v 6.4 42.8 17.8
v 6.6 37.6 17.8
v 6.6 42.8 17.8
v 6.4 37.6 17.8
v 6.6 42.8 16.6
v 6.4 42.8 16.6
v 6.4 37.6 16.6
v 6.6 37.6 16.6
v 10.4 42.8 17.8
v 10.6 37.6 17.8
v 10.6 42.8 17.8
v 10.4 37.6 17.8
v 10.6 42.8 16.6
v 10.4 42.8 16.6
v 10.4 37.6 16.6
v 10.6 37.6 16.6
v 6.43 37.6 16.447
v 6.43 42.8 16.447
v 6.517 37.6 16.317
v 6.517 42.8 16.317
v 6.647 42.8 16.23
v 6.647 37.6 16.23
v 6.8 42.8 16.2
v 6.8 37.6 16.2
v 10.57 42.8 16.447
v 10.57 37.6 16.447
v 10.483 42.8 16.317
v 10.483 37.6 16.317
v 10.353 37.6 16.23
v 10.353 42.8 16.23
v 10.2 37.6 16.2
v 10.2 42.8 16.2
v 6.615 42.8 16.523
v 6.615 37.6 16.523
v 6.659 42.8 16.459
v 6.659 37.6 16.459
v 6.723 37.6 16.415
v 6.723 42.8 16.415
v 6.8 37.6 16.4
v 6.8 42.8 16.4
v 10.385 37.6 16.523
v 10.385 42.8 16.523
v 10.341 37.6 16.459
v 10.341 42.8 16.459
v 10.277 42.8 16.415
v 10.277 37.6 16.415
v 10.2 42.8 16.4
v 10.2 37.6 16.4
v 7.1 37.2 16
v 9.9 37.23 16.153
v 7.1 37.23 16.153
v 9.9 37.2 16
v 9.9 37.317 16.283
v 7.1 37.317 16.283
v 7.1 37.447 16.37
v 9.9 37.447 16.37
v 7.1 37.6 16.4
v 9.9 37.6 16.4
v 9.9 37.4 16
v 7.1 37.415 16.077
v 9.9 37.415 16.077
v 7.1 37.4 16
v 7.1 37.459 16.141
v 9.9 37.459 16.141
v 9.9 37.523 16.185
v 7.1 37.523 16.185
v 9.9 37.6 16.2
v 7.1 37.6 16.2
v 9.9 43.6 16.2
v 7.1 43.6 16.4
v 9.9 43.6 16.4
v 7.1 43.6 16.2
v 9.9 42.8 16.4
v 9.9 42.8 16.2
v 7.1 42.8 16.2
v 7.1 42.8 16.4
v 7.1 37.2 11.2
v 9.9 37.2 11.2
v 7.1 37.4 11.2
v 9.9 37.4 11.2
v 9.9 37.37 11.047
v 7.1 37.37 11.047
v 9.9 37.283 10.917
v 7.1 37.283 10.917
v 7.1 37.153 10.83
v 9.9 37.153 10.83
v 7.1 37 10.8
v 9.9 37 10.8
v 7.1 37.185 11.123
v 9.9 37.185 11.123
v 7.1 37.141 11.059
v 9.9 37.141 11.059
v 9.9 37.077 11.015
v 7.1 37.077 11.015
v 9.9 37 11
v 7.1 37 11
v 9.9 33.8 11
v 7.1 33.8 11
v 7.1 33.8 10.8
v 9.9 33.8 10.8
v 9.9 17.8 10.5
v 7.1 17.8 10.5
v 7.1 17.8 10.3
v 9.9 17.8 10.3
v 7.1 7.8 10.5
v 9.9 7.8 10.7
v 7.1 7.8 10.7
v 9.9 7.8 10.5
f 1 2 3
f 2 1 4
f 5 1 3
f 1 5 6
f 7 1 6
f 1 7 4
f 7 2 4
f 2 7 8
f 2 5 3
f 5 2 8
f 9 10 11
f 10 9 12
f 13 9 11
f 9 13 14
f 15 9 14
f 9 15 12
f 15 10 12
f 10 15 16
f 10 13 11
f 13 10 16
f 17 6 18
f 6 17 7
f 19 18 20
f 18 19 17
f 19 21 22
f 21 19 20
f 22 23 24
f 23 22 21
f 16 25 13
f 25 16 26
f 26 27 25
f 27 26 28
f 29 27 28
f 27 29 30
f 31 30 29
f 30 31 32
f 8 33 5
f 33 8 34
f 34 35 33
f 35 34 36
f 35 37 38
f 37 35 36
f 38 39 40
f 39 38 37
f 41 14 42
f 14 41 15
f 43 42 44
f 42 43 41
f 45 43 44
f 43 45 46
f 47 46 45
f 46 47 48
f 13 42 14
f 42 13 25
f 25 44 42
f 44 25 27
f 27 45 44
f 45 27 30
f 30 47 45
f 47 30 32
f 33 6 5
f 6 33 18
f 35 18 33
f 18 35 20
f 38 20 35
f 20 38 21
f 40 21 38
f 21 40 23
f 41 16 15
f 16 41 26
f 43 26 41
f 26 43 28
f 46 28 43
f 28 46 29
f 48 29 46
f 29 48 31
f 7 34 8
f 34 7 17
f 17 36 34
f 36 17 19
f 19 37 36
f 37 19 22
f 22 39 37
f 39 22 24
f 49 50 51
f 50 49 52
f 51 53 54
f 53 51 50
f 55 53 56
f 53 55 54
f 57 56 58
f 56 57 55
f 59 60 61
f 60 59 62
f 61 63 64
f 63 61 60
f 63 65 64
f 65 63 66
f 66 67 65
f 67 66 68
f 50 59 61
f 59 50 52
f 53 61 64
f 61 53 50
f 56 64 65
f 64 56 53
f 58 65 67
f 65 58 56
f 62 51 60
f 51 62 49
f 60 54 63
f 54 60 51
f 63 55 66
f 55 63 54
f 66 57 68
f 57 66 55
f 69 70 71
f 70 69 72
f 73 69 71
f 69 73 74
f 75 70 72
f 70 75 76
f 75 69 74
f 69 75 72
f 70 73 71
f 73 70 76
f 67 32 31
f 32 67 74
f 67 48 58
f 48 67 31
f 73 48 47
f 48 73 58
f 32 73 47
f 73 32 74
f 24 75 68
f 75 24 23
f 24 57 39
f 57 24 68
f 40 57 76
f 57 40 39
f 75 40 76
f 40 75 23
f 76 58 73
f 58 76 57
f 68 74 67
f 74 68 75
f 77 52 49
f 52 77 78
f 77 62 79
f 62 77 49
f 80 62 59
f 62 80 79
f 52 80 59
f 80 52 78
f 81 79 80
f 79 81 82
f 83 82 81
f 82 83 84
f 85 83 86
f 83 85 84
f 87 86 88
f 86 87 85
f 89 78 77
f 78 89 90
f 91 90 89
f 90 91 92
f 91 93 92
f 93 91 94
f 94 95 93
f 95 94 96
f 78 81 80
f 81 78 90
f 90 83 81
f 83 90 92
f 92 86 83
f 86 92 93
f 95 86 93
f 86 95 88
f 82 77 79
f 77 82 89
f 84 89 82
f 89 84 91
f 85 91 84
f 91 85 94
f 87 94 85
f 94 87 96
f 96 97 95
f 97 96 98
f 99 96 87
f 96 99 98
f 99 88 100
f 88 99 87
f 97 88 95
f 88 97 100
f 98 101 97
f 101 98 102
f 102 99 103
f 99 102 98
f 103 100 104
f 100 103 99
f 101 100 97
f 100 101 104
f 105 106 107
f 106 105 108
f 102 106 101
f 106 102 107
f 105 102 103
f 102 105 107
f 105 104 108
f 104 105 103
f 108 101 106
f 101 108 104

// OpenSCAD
// file: ../p/1-4edge.scad
use <../lib.scad>
function ldraw_lib__1_4edge() = [
// 0 Circle 0.25
// 0 Name: 1-4edge.dat
// 0 Author: James Jessiman
// 0 !LDRAW_ORG Primitive UPDATE 2017-01
// 0 !LICENSE Licensed under CC BY 4.0 : see CAreadme.txt
// 
// 0 BFC CERTIFY CCW
  [0,"BFC","CERTIFY"],
  [0,"BFC","CCW"],
// 
// 0 !HISTORY 2007-06-22 [PTadmin] Header formatted for Contributor Agreement
// 0 !HISTORY 2008-07-01 [PTadmin] Official Update 2008-01
// 0 !HISTORY 2017-01-15 [Steffen] BFCed
// 0 !HISTORY 2017-12-30 [PTadmin] Official Update 2017-01
// 
// 
// 2 24 1 0 0 0.9239 0 0.3827
  [2,24,1,0,0,0.9239,0,0.3827],
// 2 24 0.9239 0 0.3827 0.7071 0 0.7071
  [2,24,0.9239,0,0.3827,0.7071,0,0.7071],
// 2 24 0.7071 0 0.7071 0.3827 0 0.9239
  [2,24,0.7071,0,0.7071,0.3827,0,0.9239],
// 2 24 0.3827 0 0.9239 0 0 1
  [2,24,0.3827,0,0.9239,0,0,1],
];
module ldraw_lib__1_4edge(step=0, col=false, unit=2/5, alt=false, line=0.2, solid=!$preview)
    makepoly(ldraw_lib__1_4edge(), step=step, col=col, unit=unit, alt=alt, line=line, solid=solid);
ldraw_lib__1_4edge(line=0.2);
// file: ../p/1-4cyli.scad
use <../lib.scad>
function ldraw_lib__1_4cyli() = [
// 0 Cylinder 0.25
// 0 Name: 1-4cyli.dat
// 0 Author: James Jessiman
// 0 !LDRAW_ORG Primitive UPDATE 2012-01
// 0 !LICENSE Licensed under CC BY 4.0 : see CAreadme.txt
// 
// 0 BFC CERTIFY CCW
  [0,"BFC","CERTIFY"],
  [0,"BFC","CCW"],
// 
// 0 !HISTORY 2002-03-23 [sbliss] Added BFC statement.
// 0 !HISTORY 2002-04-25 [PTadmin] Official Update 2002-02
// 0 !HISTORY 2007-06-22 [PTadmin] Header formatted for Contributor Agreement
// 0 !HISTORY 2008-07-01 [PTadmin] Official Update 2008-01
// 0 !HISTORY 2012-02-16 [Philo] Changed to CCW
// 0 !HISTORY 2012-03-30 [PTadmin] Official Update 2012-01
// 
// 
// 4 16 1 1 0 0.9239 1 0.3827 0.9239 0 0.3827 1 0 0
  [4,16,1,1,0,0.9239,1,0.3827,0.9239,0,0.3827,1,0,0],
// 5 24 1 0 0 1 1 0 0.9239 0 0.3827 1 0 -1
  [5,24,1,0,0,1,1,0,0.9239,0,0.3827,1,0,-1],
// 4 16 0.9239 1 0.3827 0.7071 1 0.7071 0.7071 0 0.7071 0.9239 0 0.3827
  [4,16,0.9239,1,0.3827,0.7071,1,0.7071,0.7071,0,0.7071,0.9239,0,0.3827],
// 5 24 0.9239 0 0.3827 0.9239 1 0.3827 0.7071 0 0.7071 1 0 0
  [5,24,0.9239,0,0.3827,0.9239,1,0.3827,0.7071,0,0.7071,1,0,0],
// 4 16 0.7071 1 0.7071 0.3827 1 0.9239 0.3827 0 0.9239 0.7071 0 0.7071
  [4,16,0.7071,1,0.7071,0.3827,1,0.9239,0.3827,0,0.9239,0.7071,0,0.7071],
// 5 24 0.7071 0 0.7071 0.7071 1 0.7071 0.3827 0 0.9239 0.9239 0 0.3827
  [5,24,0.7071,0,0.7071,0.7071,1,0.7071,0.3827,0,0.9239,0.9239,0,0.3827],
// 4 16 0.3827 1 0.9239 0 1 1 0 0 1 0.3827 0 0.9239
  [4,16,0.3827,1,0.9239,0,1,1,0,0,1,0.3827,0,0.9239],
// 5 24 0.3827 0 0.9239 0.3827 1 0.9239 0 0 1 0.7071 0 0.7071
  [5,24,0.3827,0,0.9239,0.3827,1,0.9239,0,0,1,0.7071,0,0.7071],
// 5 24 0 0 1 0 1 1 0.3827 0 0.9239 -1 0 1
  [5,24,0,0,1,0,1,1,0.3827,0,0.9239,-1,0,1],
];
module ldraw_lib__1_4cyli(step=0, col=false, unit=2/5, alt=false, line=0.2, solid=!$preview)
    makepoly(ldraw_lib__1_4cyli(), step=step, col=col, unit=unit, alt=alt, line=line, solid=solid);
ldraw_lib__1_4cyli(line=0.2);
// file: ../p/box5-4a.scad
use <../lib.scad>
function ldraw_lib__box5_4a() = [
// 0 Box with  5 Faces without  4 Adjacent Edges
// 0 Name: box5-4a.dat
// 0 Author: Willy Tschager [Holly-Wood]
// 0 !LDRAW_ORG Primitive UPDATE 2024-01
// 0 !LICENSE Licensed under CC BY 4.0 : see CAreadme.txt
// 
// 0 BFC CERTIFY CCW
  [0,"BFC","CERTIFY"],
  [0,"BFC","CCW"],
// 
// 0 !HISTORY 2009-05-02 [PTadmin] Official Update 2009-01
// 0 !HISTORY 2024-01-03 [Holly-Wood] Complete re-write, original by guyvivan
// 0 !HISTORY 2024-01-29 [OrionP] Official Update 2024-01
// 
// 2 24 -1 1 -1 -1 1 1
  [2,24,-1,1,-1,-1,1,1],
// 2 24 1 1 1 1 1 -1
  [2,24,1,1,1,1,1,-1],
// 2 24 -1 1 1 1 1 1
  [2,24,-1,1,1,1,1,1],
// 2 24 -1 1 -1 1 1 -1
  [2,24,-1,1,-1,1,1,-1],
// 4 16 1 1 1 1 1 -1 -1 1 -1 -1 1 1
  [4,16,1,1,1,1,1,-1,-1,1,-1,-1,1,1],
// 
// 2 24 -1 0 -1 -1 1 -1
  [2,24,-1,0,-1,-1,1,-1],
// 2 24 -1 1 1 -1 0 1
  [2,24,-1,1,1,-1,0,1],
// 4 16 -1 1 1 -1 1 -1 -1 0 -1 -1 0 1
  [4,16,-1,1,1,-1,1,-1,-1,0,-1,-1,0,1],
// 
// 2 24 1 0 -1 1 1 -1
  [2,24,1,0,-1,1,1,-1],
// 2 24 1 1 1 1 0 1
  [2,24,1,1,1,1,0,1],
// 4 16 1 1 -1 1 1 1 1 0 1 1 0 -1
  [4,16,1,1,-1,1,1,1,1,0,1,1,0,-1],
// 
// 4 16 1 1 1 -1 1 1 -1 0 1 1 0 1
  [4,16,1,1,1,-1,1,1,-1,0,1,1,0,1],
// 4 16 -1 1 -1 1 1 -1 1 0 -1 -1 0 -1
  [4,16,-1,1,-1,1,1,-1,1,0,-1,-1,0,-1],
];
module ldraw_lib__box5_4a(step=0, col=false, unit=2/5, alt=false, line=0.2, solid=!$preview)
    makepoly(ldraw_lib__box5_4a(), step=step, col=col, unit=unit, alt=alt, line=line, solid=solid);
ldraw_lib__box5_4a(line=0.2);
// file: ../p/box5-2p.scad
use <../lib.scad>
function ldraw_lib__box5_2p() = [
// 0 Box with  5 Faces without  2 Parallel Edges
// 0 Name: box5-2p.dat
// 0 Author: Willy Tschager [Holly-Wood]
// 0 !LDRAW_ORG Primitive UPDATE 2024-01
// 0 !LICENSE Licensed under CC BY 4.0 : see CAreadme.txt
// 
// 0 BFC CERTIFY CCW
  [0,"BFC","CERTIFY"],
  [0,"BFC","CCW"],
// 
// 0 !HISTORY 2012-03-30 [PTadmin] Official Update 2012-01
// 0 !HISTORY 2024-01-04 [Holly-Wood] Complete re-write, original by Brickaneer
// 0 !HISTORY 2024-01-29 [OrionP] Official Update 2024-01
// 
// 2 24 -1 1 1 1 1 1
  [2,24,-1,1,1,1,1,1],
// 2 24 -1 1 -1 -1 1 1
  [2,24,-1,1,-1,-1,1,1],
// 2 24 1 1 -1 -1 1 -1
  [2,24,1,1,-1,-1,1,-1],
// 2 24 1 1 1 1 1 -1
  [2,24,1,1,1,1,1,-1],
// 4 16 1 1 1 1 1 -1 -1 1 -1 -1 1 1
  [4,16,1,1,1,1,1,-1,-1,1,-1,-1,1,1],
// 
// 2 24 -1 1 1 -1 0 1
  [2,24,-1,1,1,-1,0,1],
// 2 24 -1 1 -1 -1 0 -1
  [2,24,-1,1,-1,-1,0,-1],
// 2 24 -1 0 -1 -1 0 1
  [2,24,-1,0,-1,-1,0,1],
// 4 16 -1 1 1 -1 1 -1 -1 0 -1 -1 0 1
  [4,16,-1,1,1,-1,1,-1,-1,0,-1,-1,0,1],
// 
// 2 24 1 1 1 1 0 1
  [2,24,1,1,1,1,0,1],
// 2 24 1 1 -1 1 0 -1
  [2,24,1,1,-1,1,0,-1],
// 2 24 1 0 1 1 0 -1
  [2,24,1,0,1,1,0,-1],
// 4 16 1 1 -1 1 1 1 1 0 1 1 0 -1
  [4,16,1,1,-1,1,1,1,1,0,1,1,0,-1],
// 
// 4 16 1 1 1 -1 1 1 -1 0 1 1 0 1
  [4,16,1,1,1,-1,1,1,-1,0,1,1,0,1],
// 4 16 -1 1 -1 1 1 -1 1 0 -1 -1 0 -1
  [4,16,-1,1,-1,1,1,-1,1,0,-1,-1,0,-1],
];
module ldraw_lib__box5_2p(step=0, col=false, unit=2/5, alt=false, line=0.2, solid=!$preview)
    makepoly(ldraw_lib__box5_2p(), step=step, col=col, unit=unit, alt=alt, line=line, solid=solid);
ldraw_lib__box5_2p(line=0.2);
// file: ../p/box4o8a.scad
use <../lib.scad>
function ldraw_lib__box4o8a() = [
// 0 Box with 4 Faces (2 Parallel Pairs) without Top and Bottom Edges
// 0 Name: box4o8a.dat
// 0 Author: Steffen [Steffen]
// 0 !LDRAW_ORG Primitive UPDATE 2012-01
// 0 !LICENSE Licensed under CC BY 4.0 : see CAreadme.txt
// 
// 0 BFC CERTIFY CCW
  [0,"BFC","CERTIFY"],
  [0,"BFC","CCW"],
// 
// 0 !HISTORY 2004-04-22 [PTadmin] Official Update 2004-02
// 0 !HISTORY 2007-06-24 [PTadmin] Header formatted for Contributor Agreement
// 0 !HISTORY 2008-07-01 [PTadmin] Official Update 2008-01
// 0 !HISTORY 2012-02-16 [Philo] Changed to CCW
// 0 !HISTORY 2012-03-30 [PTadmin] Official Update 2012-01
// 
// 
// 2 24 1 0 1 1 1 1
  [2,24,1,0,1,1,1,1],
// 2 24 -1 0 1 -1 1 1
  [2,24,-1,0,1,-1,1,1],
// 2 24 1 0 -1 1 1 -1
  [2,24,1,0,-1,1,1,-1],
// 2 24 -1 0 -1 -1 1 -1
  [2,24,-1,0,-1,-1,1,-1],
// 4 16 -1 1 1 -1 0 1 1 0 1 1 1 1
  [4,16,-1,1,1,-1,0,1,1,0,1,1,1,1],
// 4 16 -1 1 -1 -1 0 -1 -1 0 1 -1 1 1
  [4,16,-1,1,-1,-1,0,-1,-1,0,1,-1,1,1],
// 4 16 1 1 -1 1 0 -1 -1 0 -1 -1 1 -1
  [4,16,1,1,-1,1,0,-1,-1,0,-1,-1,1,-1],
// 4 16 1 1 1 1 0 1 1 0 -1 1 1 -1
  [4,16,1,1,1,1,0,1,1,0,-1,1,1,-1],
];
module ldraw_lib__box4o8a(step=0, col=false, unit=2/5, alt=false, line=0.2, solid=!$preview)
    makepoly(ldraw_lib__box4o8a(), step=step, col=col, unit=unit, alt=alt, line=line, solid=solid);
ldraw_lib__box4o8a(line=0.2);
// file: ../p/1-4ring1.scad
use <../lib.scad>
function ldraw_lib__1_4ring1() = [
// 0 Ring  1 x 0.25
// 0 Name: 1-4ring1.dat
// 0 Author: Chris Dee [cwdee]
// 0 !LDRAW_ORG Primitive UPDATE 2012-01
// 0 !LICENSE Licensed under CC BY 4.0 : see CAreadme.txt
// 
// 0 BFC CERTIFY CCW
  [0,"BFC","CERTIFY"],
  [0,"BFC","CCW"],
// 
// 0 !HISTORY 2000-05-07 [PTadmin] Official Update 2000-01
// 0 !HISTORY 2002-11-22 [hafhead] Added BFC statement
// 0 !HISTORY 2002-11-30 [PTadmin] Official Update 2002-05
// 0 !HISTORY 2007-06-22 [PTadmin] Header formatted for Contributor Agreement
// 0 !HISTORY 2008-07-01 [PTadmin] Official Update 2008-01
// 0 !HISTORY 2012-02-16 [Philo] Changed to CCW
// 0 !HISTORY 2012-03-30 [PTadmin] Official Update 2012-01
// 
// 
// 4 16 2 0 0 1.8478 0 0.7654 0.9239 0 0.3827 1 0 0
  [4,16,2,0,0,1.8478,0,0.7654,0.9239,0,0.3827,1,0,0],
// 4 16 1.8478 0 0.7654 1.4142 0 1.4142 0.7071 0 0.7071 0.9239 0 0.3827
  [4,16,1.8478,0,0.7654,1.4142,0,1.4142,0.7071,0,0.7071,0.9239,0,0.3827],
// 4 16 1.4142 0 1.4142 0.7654 0 1.8478 0.3827 0 0.9239 0.7071 0 0.7071
  [4,16,1.4142,0,1.4142,0.7654,0,1.8478,0.3827,0,0.9239,0.7071,0,0.7071],
// 4 16 0.7654 0 1.8478 0 0 2 0 0 1 0.3827 0 0.9239
  [4,16,0.7654,0,1.8478,0,0,2,0,0,1,0.3827,0,0.9239],
];
module ldraw_lib__1_4ring1(step=0, col=false, unit=2/5, alt=false, line=0.2, solid=!$preview)
    makepoly(ldraw_lib__1_4ring1(), step=step, col=col, unit=unit, alt=alt, line=line, solid=solid);
ldraw_lib__1_4ring1(line=0.2);
// file: ../p/1-4cylo.scad
use <../lib.scad>
use <1-4cyli.scad>
use <1-4edge.scad>
function ldraw_lib__1_4cylo() = [
// 0 Cylinder Open 0.25
// 0 Name: 1-4cylo.dat
// 0 Author: Max Martin Richter [MMR1988]
// 0 !LDRAW_ORG Primitive UPDATE 2010-03
// 0 !LICENSE Licensed under CC BY 4.0 : see CAreadme.txt
// 
// 0 BFC CERTIFY CCW
  [0,"BFC","CERTIFY"],
  [0,"BFC","CCW"],
// 
// 0 !HISTORY 2010-12-31 [PTadmin] Official Update 2010-03
// 
// 
// 1 16 0 0 0 1 0 0 0 1 0 0 0 1 1-4edge.dat
  [1,16,0,0,0,1,0,0,0,1,0,0,0,1, ldraw_lib__1_4edge()],
// 1 16 0 1 0 1 0 0 0 1 0 0 0 1 1-4edge.dat
  [1,16,0,1,0,1,0,0,0,1,0,0,0,1, ldraw_lib__1_4edge()],
// 1 16 0 0 0 1 0 0 0 1 0 0 0 1 1-4cyli.dat
  [1,16,0,0,0,1,0,0,0,1,0,0,0,1, ldraw_lib__1_4cyli()],
];
module ldraw_lib__1_4cylo(step=0, col=false, unit=2/5, alt=false, line=0.2, solid=!$preview)
    makepoly(ldraw_lib__1_4cylo(), step=step, col=col, unit=unit, alt=alt, line=line, solid=solid);
ldraw_lib__1_4cylo(line=0.2);
// main file
use <../lib.scad>
use <../p/1-4cylo.scad>
use <../p/1-4ring1.scad>
use <../p/box4o8a.scad>
use <../p/box5-2p.scad>
use <../p/box5-4a.scad>
function ldraw_lib__u9574_f2() = [
// 0 ~Electric 9V Battery Box  4 x 14 x  4 - Buttons - Contact, Button Pressed Position
// 0 Name: u9574-f2.dat
// 0 Author: Gerald Lasser [GeraldLasser]
// 0 !LDRAW_ORG Part UPDATE 2024-11
// 0 !LICENSE Licensed under CC BY 4.0 : see CAreadme.txt
// 
// 0 BFC CERTIFY CCW
  [0,"BFC","CERTIFY"],
  [0,"BFC","CCW"],
// 
// 0 !HISTORY 2024-12-30 [OrionP] Official Update 2024-11
// 
// 1 16 16.25 -41.5 100.5 .25 0 0 0 -3 0 0 0 6.5 box5-4a.dat
  [1,16,16.25,-41.5,100.5,.25,0,0,0,-3,0,0,0,6.5, ldraw_lib__box5_4a()],
// 1 16 26.25 -41.5 100.5 .25 0 0 0 -3 0 0 0 6.5 box5-4a.dat
  [1,16,26.25,-41.5,100.5,.25,0,0,0,-3,0,0,0,6.5, ldraw_lib__box5_4a()],
// 1 16 17 -41.5 107 -1 0 0 0 0 1 0 -13 0 1-4cylo.dat
  [1,16,17,-41.5,107,-1,0,0,0,0,1,0,-13,0, ldraw_lib__1_4cylo()],
// 1 16 25.5 -41.5 107 1 0 0 0 0 1 0 -13 0 1-4cylo.dat
  [1,16,25.5,-41.5,107,1,0,0,0,0,1,0,-13,0, ldraw_lib__1_4cylo()],
// 0 BFC INVERTNEXT
  [0,"BFC","INVERTNEXT"],
// 1 16 17 -41.5 107 -.5 0 0 0 0 .5 0 -13 0 1-4cylo.dat
  [1,16,17,-41.5,107,-.5,0,0,0,0,.5,0,-13,0, ldraw_lib__1_4cylo()],
// 0 BFC INVERTNEXT
  [0,"BFC","INVERTNEXT"],
// 1 16 25.5 -41.5 107 .5 0 0 0 0 .5 0 -13 0 1-4cylo.dat
  [1,16,25.5,-41.5,107,.5,0,0,0,0,.5,0,-13,0, ldraw_lib__1_4cylo()],
// 1 16 25.5 -41.5 107 .5 0 0 0 0 .5 0 -1 0 1-4ring1.dat
  [1,16,25.5,-41.5,107,.5,0,0,0,0,.5,0,-1,0, ldraw_lib__1_4ring1()],
// 1 16 17 -41.5 107 -.5 0 0 0 0 .5 0 -1 0 1-4ring1.dat
  [1,16,17,-41.5,107,-.5,0,0,0,0,.5,0,-1,0, ldraw_lib__1_4ring1()],
// 1 16 25.5 -41.5 94 .5 0 0 0 0 .5 0 1 0 1-4ring1.dat
  [1,16,25.5,-41.5,94,.5,0,0,0,0,.5,0,1,0, ldraw_lib__1_4ring1()],
// 1 16 17 -41.5 94 -.5 0 0 0 0 .5 0 1 0 1-4ring1.dat
  [1,16,17,-41.5,94,-.5,0,0,0,0,.5,0,1,0, ldraw_lib__1_4ring1()],
// 
// 1 16 24.75 -40 94 0 -7 0 0 0 -1 -1 0 0 1-4cylo.dat
  [1,16,24.75,-40,94,0,-7,0,0,0,-1,-1,0,0, ldraw_lib__1_4cylo()],
// 0 BFC INVERTNEXT
  [0,"BFC","INVERTNEXT"],
// 1 16 24.75 -40 94 0 -7 0 0 0 -.5 -.5 0 0 1-4cylo.dat
  [1,16,24.75,-40,94,0,-7,0,0,0,-.5,-.5,0,0, ldraw_lib__1_4cylo()],
// 1 16 24.75 -40 94 0 -1 0 0 0 -.5 -.5 0 0 1-4ring1.dat
  [1,16,24.75,-40,94,0,-1,0,0,0,-.5,-.5,0,0, ldraw_lib__1_4ring1()],
// 1 16 17.75 -40 94 0 1 0 0 0 -.5 -.5 0 0 1-4ring1.dat
  [1,16,17.75,-40,94,0,1,0,0,0,-.5,-.5,0,0, ldraw_lib__1_4ring1()],
// 2 24 24.75 -41 94 24.75 -40.5 94
  [2,24,24.75,-41,94,24.75,-40.5,94],
// 2 24 17.75 -41 94 17.75 -40.5 94
  [2,24,17.75,-41,94,17.75,-40.5,94],
// 1 16 21.25 -40.75 107 -3.5 0 0 0 0 .25 0 2 0 box5-2p.dat
  [1,16,21.25,-40.75,107,-3.5,0,0,0,0,.25,0,2,0, ldraw_lib__box5_2p()],
// 1 16 24.75 -40.75 100.5 0 .75 0 0 0 .25 6.5 0 0 box4o8a.dat
  [1,16,24.75,-40.75,100.5,0,.75,0,0,0,.25,6.5,0,0, ldraw_lib__box4o8a()],
// 1 16 17 -40.75 100.5 0 .75 0 0 0 .25 6.5 0 0 box4o8a.dat
  [1,16,17,-40.75,100.5,0,.75,0,0,0,.25,6.5,0,0, ldraw_lib__box4o8a()],
// 4 16 17.75 -41 107 17.75 -41 94 24.75 -41 94 24.75 -41 107
  [4,16,17.75,-41,107,17.75,-41,94,24.75,-41,94,24.75,-41,107],
// 4 16 17.75 -40.5 94 17.75 -40.5 107 24.75 -40.5 107 24.75 -40.5 94
  [4,16,17.75,-40.5,94,17.75,-40.5,107,24.75,-40.5,107,24.75,-40.5,94],
// 1 16 21.25 -40 93.25 3.5 0 0 0 12 0 0 0 -.25 box4o8a.dat
  [1,16,21.25,-40,93.25,3.5,0,0,0,12,0,0,0,-.25, ldraw_lib__box4o8a()],
// 1 16 24.75 -28 92.5 0 -7 0 0 0 1 1 0 0 1-4cylo.dat
  [1,16,24.75,-28,92.5,0,-7,0,0,0,1,1,0,0, ldraw_lib__1_4cylo()],
// 0 BFC INVERTNEXT
  [0,"BFC","INVERTNEXT"],
// 1 16 24.75 -28 92.5 0 -7 0 0 0 .5 .5 0 0 1-4cylo.dat
  [1,16,24.75,-28,92.5,0,-7,0,0,0,.5,.5,0,0, ldraw_lib__1_4cylo()],
// 1 16 24.75 -28 92.5 0 -1 0 0 0 .5 .5 0 0 1-4ring1.dat
  [1,16,24.75,-28,92.5,0,-1,0,0,0,.5,.5,0,0, ldraw_lib__1_4ring1()],
// 1 16 17.75 -28 92.5 0 1 0 0 0 .5 .5 0 0 1-4ring1.dat
  [1,16,17.75,-28,92.5,0,1,0,0,0,.5,.5,0,0, ldraw_lib__1_4ring1()],
// 1 16 21.25 -27.25 92.5 3.5 0 0 0 0 -.25 0 -8 0 box4o8a.dat
  [1,16,21.25,-27.25,92.5,3.5,0,0,0,0,-.25,0,-8,0, ldraw_lib__box4o8a()],
// 1 16 21.25 -27.25 84.5 3.5 0 0 0 1.25 -.25 0 -40 0 box4o8a.dat
  [1,16,21.25,-27.25,84.5,3.5,0,0,0,1.25,-.25,0,-40,0, ldraw_lib__box4o8a()],
// 1 16 21.25 -26 44.5 3.5 0 0 0 -.5 -.25 0 -25 0 box5-4a.dat
  [1,16,21.25,-26,44.5,3.5,0,0,0,-.5,-.25,0,-25,0, ldraw_lib__box5_4a()],
// 5 24 17.75 -27.5 84.5 24.75 -27.5 84.5 24.75 -26.25 44.5 17.75 -27.5 92.5
  [5,24,17.75,-27.5,84.5,24.75,-27.5,84.5,24.75,-26.25,44.5,17.75,-27.5,92.5],
// 5 24 24.75 -26.25 44.5 17.75 -26.25 44.5 17.75 -27.5 84.5 24.75 -26.75 19.5
  [5,24,24.75,-26.25,44.5,17.75,-26.25,44.5,17.75,-27.5,84.5,24.75,-26.75,19.5],
// 5 24 17.75 -25.75 44.5 24.75 -25.75 44.5 24.75 -27 84.5 17.75 -26.25 19.5
  [5,24,17.75,-25.75,44.5,24.75,-25.75,44.5,24.75,-27,84.5,17.75,-26.25,19.5],
// 5 24 17.75 -27 84.5 24.75 -27 84.5 17.75 -25.75 44.5 24.75 -27 92.5
  [5,24,17.75,-27,84.5,24.75,-27,84.5,17.75,-25.75,44.5,24.75,-27,92.5],
];
module ldraw_lib__u9574_f2(step=0, col=false, unit=2/5, alt=false, line=0.2, solid=!$preview)
    makepoly(ldraw_lib__u9574_f2(), step=step, col=col, unit=unit, alt=alt, line=line, solid=solid);
ldraw_lib__u9574_f2(line=0.2);
